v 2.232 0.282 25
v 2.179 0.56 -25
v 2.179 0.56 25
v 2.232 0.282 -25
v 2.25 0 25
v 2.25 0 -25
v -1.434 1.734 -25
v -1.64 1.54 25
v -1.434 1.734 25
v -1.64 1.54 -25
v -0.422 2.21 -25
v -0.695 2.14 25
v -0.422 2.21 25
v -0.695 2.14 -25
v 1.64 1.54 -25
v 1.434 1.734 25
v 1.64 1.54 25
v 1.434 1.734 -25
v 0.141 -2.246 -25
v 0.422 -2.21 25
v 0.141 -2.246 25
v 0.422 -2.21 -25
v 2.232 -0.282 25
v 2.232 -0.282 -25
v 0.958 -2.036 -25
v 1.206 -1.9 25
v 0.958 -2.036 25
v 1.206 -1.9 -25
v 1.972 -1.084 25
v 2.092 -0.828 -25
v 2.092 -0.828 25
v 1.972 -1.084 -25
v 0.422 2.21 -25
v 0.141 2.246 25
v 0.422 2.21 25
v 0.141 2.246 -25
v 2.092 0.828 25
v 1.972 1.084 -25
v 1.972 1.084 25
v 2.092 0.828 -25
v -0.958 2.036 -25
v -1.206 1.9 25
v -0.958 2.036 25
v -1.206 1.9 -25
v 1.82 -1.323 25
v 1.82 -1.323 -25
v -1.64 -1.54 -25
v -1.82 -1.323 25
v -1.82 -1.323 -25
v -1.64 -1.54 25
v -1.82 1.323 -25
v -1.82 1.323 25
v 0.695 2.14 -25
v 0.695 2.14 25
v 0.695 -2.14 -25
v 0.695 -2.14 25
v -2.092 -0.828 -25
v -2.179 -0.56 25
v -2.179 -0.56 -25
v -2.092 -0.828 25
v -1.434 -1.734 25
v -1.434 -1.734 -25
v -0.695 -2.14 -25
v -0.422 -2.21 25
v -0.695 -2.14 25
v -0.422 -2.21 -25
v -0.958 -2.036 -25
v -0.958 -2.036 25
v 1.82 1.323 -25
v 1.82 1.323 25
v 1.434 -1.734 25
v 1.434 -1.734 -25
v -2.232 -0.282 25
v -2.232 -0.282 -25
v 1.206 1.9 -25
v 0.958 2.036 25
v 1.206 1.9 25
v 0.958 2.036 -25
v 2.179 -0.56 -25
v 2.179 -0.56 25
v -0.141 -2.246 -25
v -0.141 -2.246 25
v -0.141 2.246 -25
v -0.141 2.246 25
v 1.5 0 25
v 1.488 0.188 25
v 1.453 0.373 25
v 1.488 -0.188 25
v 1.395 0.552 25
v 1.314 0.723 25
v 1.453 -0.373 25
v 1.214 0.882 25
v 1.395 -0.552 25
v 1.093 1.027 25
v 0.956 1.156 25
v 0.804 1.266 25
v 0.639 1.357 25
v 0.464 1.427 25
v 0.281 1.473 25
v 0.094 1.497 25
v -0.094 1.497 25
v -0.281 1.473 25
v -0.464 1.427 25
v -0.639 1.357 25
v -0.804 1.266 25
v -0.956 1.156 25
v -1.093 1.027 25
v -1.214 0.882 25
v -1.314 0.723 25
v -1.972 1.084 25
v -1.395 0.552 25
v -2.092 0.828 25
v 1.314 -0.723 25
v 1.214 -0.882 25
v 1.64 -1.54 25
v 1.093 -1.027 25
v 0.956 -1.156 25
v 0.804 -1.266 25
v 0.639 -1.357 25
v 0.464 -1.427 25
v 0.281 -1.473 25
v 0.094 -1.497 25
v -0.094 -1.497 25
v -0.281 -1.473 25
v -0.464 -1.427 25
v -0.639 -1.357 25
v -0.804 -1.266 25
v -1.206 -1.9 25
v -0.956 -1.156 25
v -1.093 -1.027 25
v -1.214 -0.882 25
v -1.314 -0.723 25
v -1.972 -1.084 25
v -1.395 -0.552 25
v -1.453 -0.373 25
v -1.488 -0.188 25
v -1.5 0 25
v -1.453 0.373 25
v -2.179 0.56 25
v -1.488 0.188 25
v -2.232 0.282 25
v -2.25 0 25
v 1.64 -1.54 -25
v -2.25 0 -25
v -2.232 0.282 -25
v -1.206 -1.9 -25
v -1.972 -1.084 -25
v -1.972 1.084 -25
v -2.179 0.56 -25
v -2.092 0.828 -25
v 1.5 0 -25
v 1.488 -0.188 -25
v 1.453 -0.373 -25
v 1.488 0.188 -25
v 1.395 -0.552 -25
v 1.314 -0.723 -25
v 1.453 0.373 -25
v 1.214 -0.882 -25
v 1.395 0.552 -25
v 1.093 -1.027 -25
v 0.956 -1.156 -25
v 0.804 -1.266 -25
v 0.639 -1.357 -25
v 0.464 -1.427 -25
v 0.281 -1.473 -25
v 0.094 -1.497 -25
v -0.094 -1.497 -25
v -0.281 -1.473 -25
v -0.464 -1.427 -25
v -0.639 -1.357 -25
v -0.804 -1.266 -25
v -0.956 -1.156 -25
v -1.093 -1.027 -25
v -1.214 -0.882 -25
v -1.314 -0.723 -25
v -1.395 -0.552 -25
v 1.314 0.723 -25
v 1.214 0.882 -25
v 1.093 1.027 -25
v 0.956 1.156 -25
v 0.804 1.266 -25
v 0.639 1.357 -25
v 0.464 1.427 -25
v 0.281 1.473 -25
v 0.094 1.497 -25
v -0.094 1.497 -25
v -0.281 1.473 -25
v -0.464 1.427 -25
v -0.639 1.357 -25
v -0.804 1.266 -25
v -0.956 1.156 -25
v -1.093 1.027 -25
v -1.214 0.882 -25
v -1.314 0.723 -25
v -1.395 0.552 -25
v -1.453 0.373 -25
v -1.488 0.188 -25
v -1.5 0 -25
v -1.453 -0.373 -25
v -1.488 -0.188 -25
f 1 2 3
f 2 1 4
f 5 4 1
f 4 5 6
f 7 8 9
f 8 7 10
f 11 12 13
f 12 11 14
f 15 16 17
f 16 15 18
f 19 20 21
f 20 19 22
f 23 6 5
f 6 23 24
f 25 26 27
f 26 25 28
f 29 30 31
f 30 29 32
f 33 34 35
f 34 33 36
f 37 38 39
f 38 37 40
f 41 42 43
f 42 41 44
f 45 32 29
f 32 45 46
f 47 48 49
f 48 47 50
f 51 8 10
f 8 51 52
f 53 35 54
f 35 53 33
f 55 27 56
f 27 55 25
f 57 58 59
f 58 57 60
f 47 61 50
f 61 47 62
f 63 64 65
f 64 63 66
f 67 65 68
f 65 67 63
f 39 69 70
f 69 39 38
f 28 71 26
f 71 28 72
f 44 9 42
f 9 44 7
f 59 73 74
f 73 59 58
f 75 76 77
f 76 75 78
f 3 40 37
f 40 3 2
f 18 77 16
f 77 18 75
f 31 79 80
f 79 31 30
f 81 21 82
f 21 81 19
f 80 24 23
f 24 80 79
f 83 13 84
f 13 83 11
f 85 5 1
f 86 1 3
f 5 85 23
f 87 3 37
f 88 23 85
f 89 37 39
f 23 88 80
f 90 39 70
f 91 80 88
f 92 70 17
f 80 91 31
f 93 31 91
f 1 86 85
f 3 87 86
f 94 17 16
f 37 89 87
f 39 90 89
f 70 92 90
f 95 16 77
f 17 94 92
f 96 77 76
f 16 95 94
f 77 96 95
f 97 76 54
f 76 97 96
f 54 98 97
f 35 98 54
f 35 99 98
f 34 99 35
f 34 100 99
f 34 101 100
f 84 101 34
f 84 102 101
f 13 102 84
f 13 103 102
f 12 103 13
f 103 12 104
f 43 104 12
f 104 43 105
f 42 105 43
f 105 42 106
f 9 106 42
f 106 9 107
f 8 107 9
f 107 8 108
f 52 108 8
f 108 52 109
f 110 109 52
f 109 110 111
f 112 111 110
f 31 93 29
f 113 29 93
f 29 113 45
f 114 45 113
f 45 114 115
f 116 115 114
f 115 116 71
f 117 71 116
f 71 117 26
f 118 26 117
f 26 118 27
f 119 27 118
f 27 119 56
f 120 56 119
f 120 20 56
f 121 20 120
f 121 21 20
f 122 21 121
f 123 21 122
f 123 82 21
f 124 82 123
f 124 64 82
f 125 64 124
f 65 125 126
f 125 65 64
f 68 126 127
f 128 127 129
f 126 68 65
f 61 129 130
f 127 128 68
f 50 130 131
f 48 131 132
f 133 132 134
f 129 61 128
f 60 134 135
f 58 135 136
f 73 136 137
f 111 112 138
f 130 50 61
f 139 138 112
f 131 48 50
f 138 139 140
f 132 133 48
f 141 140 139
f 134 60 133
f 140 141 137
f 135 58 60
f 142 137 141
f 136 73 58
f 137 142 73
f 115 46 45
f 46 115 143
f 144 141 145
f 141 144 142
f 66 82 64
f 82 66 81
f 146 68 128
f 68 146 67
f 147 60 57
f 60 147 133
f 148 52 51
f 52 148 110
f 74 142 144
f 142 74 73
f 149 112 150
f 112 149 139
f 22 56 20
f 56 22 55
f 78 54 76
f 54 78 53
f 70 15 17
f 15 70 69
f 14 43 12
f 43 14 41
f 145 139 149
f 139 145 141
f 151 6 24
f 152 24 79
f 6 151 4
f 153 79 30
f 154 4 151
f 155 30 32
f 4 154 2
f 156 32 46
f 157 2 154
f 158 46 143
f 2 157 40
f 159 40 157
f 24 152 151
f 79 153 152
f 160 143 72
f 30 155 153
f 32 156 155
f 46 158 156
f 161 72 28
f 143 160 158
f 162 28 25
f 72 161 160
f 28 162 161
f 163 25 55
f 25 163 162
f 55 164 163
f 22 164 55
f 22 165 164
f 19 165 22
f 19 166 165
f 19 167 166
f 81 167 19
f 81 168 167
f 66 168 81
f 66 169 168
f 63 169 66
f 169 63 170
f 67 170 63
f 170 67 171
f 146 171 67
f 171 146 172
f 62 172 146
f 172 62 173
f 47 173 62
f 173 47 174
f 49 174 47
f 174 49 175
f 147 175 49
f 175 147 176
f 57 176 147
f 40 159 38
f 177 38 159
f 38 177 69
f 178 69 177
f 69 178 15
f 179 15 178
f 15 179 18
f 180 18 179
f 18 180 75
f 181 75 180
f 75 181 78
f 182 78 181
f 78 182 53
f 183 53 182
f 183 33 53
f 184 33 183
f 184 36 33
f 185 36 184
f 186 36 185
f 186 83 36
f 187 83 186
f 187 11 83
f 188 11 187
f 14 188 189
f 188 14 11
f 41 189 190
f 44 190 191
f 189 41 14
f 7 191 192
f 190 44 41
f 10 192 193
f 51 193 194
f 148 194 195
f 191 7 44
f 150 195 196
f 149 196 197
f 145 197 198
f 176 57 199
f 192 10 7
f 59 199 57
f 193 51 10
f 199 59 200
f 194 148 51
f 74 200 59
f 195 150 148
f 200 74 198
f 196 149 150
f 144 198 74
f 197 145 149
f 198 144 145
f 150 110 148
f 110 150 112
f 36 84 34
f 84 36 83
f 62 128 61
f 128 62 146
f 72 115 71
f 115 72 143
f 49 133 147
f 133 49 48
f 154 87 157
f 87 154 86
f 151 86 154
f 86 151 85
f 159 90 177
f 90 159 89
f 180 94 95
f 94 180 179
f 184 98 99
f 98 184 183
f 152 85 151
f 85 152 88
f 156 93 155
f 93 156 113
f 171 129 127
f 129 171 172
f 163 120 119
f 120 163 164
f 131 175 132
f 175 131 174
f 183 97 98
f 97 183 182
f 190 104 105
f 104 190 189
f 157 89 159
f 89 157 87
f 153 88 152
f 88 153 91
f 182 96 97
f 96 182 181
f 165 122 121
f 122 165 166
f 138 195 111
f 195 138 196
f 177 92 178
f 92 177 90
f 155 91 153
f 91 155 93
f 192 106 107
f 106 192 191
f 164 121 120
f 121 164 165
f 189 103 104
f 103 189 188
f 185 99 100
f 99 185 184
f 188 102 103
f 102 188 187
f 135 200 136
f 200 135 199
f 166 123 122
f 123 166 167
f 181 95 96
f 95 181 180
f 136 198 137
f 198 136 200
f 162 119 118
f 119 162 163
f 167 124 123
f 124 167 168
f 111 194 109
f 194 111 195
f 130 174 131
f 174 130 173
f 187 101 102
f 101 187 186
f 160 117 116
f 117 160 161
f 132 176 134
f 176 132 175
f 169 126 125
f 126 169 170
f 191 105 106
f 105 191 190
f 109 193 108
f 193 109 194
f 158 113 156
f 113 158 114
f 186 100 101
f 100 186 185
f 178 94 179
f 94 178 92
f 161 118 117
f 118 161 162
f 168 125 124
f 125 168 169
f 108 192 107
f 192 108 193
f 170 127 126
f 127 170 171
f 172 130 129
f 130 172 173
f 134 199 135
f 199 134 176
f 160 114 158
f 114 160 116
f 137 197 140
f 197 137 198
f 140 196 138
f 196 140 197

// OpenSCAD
$fn = 50;


difference() {
	union() {
		translate(v = [0, 0, -25.0000000000]) {
			cylinder(h = 50, r = 2.2500000000);
		}
	}
	union() {
		translate(v = [0, 0, -100.0000000000]) {
			cylinder(h = 200, r = 1.5000000000);
		}
	}
}
